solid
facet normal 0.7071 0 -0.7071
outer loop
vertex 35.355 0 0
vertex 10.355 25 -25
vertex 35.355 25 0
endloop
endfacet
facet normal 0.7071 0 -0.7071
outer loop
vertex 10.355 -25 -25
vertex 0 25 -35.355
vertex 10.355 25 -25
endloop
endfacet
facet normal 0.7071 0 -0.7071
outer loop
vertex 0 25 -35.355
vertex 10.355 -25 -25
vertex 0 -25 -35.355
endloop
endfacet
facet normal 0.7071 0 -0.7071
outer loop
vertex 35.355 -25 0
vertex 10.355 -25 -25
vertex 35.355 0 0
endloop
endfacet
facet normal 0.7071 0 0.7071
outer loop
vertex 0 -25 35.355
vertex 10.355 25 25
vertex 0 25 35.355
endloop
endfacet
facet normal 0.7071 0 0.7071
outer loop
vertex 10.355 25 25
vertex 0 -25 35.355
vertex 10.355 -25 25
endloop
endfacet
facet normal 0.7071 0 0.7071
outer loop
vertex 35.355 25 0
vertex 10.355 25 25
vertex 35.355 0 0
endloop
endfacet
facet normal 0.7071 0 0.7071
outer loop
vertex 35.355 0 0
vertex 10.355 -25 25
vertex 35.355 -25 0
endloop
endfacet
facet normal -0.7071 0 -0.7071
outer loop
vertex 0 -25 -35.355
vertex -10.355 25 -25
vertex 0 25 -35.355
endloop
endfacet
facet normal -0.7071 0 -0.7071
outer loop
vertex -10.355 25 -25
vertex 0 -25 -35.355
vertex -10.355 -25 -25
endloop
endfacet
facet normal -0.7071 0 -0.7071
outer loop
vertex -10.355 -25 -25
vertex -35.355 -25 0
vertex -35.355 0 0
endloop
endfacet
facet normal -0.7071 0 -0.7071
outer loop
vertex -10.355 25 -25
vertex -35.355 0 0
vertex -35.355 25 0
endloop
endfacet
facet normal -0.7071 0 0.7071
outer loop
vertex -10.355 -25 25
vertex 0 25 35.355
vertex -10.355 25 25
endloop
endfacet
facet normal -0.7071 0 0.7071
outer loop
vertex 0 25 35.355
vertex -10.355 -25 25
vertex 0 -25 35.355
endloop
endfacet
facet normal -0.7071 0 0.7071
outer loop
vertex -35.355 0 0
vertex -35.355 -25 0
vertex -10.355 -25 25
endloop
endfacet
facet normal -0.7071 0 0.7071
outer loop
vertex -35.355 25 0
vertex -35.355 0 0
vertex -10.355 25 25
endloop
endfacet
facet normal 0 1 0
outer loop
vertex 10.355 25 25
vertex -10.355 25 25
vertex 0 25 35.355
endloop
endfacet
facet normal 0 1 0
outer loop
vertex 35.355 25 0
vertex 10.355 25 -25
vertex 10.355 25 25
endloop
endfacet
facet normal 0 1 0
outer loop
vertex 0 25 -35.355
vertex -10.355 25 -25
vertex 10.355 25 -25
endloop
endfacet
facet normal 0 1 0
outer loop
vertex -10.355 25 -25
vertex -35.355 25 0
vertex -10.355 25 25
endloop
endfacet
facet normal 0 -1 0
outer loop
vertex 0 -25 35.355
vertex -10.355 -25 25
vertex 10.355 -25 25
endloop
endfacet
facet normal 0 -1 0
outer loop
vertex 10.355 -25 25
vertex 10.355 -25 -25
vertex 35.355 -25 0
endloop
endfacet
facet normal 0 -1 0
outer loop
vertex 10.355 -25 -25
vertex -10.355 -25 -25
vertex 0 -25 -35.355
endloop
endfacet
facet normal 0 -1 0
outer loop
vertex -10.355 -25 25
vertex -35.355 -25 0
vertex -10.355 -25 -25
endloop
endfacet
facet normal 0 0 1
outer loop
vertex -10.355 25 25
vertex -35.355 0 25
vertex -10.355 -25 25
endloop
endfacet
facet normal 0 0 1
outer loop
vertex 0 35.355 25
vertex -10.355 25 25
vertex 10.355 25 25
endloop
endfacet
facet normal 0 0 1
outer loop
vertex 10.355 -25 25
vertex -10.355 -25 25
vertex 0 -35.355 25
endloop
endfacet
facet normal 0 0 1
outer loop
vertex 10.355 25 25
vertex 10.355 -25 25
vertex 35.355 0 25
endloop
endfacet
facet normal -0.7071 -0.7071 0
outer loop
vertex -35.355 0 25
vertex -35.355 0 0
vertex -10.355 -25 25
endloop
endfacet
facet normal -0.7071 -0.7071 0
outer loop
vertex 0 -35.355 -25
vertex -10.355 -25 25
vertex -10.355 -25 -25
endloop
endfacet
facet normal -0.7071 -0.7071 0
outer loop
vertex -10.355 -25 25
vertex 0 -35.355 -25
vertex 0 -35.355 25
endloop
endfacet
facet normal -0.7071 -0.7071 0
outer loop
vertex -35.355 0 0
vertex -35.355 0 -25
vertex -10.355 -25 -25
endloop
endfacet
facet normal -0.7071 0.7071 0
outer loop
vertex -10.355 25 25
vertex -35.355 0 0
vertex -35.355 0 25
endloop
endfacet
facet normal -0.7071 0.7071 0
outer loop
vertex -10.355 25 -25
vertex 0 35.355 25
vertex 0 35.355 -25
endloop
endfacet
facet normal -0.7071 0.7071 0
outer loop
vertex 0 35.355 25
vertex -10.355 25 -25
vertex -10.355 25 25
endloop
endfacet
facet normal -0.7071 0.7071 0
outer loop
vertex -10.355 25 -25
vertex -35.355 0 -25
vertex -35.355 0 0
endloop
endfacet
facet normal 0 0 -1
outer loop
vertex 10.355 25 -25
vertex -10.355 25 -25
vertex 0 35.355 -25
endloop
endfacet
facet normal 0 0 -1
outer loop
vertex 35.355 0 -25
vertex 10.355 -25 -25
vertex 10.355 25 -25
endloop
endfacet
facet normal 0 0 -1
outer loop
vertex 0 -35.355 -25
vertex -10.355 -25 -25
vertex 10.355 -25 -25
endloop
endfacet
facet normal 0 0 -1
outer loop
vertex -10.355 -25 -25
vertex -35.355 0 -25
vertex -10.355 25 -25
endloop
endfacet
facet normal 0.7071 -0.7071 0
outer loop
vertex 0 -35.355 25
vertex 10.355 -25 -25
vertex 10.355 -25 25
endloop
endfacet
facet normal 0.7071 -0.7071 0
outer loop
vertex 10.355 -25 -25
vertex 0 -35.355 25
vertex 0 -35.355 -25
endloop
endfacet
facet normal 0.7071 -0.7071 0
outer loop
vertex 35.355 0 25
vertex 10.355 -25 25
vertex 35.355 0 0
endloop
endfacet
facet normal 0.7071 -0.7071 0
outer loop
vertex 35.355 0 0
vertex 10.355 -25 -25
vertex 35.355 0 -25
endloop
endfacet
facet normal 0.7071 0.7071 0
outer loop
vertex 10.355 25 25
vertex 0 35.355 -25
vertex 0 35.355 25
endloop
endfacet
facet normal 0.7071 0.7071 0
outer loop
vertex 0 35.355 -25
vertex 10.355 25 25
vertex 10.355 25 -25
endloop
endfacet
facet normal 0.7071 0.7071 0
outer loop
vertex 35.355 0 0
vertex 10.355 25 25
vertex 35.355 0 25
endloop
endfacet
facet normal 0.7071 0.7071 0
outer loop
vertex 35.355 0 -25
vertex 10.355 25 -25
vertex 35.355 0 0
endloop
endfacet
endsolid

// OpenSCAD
rotate([0, 45, 0]) cube(50, true);
rotate([0, 0, 45]) cube(50, true);
